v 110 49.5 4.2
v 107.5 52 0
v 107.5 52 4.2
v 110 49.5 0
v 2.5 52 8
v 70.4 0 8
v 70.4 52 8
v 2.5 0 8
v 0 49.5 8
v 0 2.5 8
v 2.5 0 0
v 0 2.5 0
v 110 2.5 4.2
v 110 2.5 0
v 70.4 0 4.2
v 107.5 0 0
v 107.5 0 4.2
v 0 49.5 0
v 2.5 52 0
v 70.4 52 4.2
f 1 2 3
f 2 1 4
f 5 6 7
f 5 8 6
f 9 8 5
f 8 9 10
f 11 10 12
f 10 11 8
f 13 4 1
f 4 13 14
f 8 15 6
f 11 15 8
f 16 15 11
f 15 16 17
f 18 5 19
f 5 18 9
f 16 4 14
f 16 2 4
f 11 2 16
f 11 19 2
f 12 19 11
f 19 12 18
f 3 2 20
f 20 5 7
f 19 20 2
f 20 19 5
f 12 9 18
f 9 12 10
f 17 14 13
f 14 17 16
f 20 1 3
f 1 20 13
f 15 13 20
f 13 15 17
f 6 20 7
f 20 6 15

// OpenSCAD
$fn = 32;

// ----------------------------------------------------------------------
// Stepped bar: endstep, 110 x 52 x 8/4.2 mm
// ----------------------------------------------------------------------

// --- parameters (mm) ---
bar_l = 110;              // bar length, X
bar_w = 52;               // bar width, Y
plate_t = 8;              // thickness of the thick zone, Z
thin_t = 4.2;             // thickness of the thin zone
corner_c = 2.5;           // corner chamfer of the bar
step_cut = 3.8;           // material removed from the thin zone
step_x = 70.4;            // step position from the left end
depth_1 = 3.8;            // depth of cut 1 from the top face

profile = [[2.5, 0], [107.5, 0], [110, 2.5], [110, 49.5], [107.5, 52], [2.5, 52], [0, 49.5], [0, 2.5]];  // primary outline, 8 points, counter clockwise
void_1 = [[70.4, -1], [111, -1], [111, 53], [70.4, 53]];  // thin zone beyond the step, 4 points

// --- the one profile operation ---
difference() {
  linear_extrude(height = plate_t) polygon(points = profile);
  translate([0, 0, plate_t - depth_1])
    linear_extrude(height = depth_1 + 1) polygon(points = void_1);
}
